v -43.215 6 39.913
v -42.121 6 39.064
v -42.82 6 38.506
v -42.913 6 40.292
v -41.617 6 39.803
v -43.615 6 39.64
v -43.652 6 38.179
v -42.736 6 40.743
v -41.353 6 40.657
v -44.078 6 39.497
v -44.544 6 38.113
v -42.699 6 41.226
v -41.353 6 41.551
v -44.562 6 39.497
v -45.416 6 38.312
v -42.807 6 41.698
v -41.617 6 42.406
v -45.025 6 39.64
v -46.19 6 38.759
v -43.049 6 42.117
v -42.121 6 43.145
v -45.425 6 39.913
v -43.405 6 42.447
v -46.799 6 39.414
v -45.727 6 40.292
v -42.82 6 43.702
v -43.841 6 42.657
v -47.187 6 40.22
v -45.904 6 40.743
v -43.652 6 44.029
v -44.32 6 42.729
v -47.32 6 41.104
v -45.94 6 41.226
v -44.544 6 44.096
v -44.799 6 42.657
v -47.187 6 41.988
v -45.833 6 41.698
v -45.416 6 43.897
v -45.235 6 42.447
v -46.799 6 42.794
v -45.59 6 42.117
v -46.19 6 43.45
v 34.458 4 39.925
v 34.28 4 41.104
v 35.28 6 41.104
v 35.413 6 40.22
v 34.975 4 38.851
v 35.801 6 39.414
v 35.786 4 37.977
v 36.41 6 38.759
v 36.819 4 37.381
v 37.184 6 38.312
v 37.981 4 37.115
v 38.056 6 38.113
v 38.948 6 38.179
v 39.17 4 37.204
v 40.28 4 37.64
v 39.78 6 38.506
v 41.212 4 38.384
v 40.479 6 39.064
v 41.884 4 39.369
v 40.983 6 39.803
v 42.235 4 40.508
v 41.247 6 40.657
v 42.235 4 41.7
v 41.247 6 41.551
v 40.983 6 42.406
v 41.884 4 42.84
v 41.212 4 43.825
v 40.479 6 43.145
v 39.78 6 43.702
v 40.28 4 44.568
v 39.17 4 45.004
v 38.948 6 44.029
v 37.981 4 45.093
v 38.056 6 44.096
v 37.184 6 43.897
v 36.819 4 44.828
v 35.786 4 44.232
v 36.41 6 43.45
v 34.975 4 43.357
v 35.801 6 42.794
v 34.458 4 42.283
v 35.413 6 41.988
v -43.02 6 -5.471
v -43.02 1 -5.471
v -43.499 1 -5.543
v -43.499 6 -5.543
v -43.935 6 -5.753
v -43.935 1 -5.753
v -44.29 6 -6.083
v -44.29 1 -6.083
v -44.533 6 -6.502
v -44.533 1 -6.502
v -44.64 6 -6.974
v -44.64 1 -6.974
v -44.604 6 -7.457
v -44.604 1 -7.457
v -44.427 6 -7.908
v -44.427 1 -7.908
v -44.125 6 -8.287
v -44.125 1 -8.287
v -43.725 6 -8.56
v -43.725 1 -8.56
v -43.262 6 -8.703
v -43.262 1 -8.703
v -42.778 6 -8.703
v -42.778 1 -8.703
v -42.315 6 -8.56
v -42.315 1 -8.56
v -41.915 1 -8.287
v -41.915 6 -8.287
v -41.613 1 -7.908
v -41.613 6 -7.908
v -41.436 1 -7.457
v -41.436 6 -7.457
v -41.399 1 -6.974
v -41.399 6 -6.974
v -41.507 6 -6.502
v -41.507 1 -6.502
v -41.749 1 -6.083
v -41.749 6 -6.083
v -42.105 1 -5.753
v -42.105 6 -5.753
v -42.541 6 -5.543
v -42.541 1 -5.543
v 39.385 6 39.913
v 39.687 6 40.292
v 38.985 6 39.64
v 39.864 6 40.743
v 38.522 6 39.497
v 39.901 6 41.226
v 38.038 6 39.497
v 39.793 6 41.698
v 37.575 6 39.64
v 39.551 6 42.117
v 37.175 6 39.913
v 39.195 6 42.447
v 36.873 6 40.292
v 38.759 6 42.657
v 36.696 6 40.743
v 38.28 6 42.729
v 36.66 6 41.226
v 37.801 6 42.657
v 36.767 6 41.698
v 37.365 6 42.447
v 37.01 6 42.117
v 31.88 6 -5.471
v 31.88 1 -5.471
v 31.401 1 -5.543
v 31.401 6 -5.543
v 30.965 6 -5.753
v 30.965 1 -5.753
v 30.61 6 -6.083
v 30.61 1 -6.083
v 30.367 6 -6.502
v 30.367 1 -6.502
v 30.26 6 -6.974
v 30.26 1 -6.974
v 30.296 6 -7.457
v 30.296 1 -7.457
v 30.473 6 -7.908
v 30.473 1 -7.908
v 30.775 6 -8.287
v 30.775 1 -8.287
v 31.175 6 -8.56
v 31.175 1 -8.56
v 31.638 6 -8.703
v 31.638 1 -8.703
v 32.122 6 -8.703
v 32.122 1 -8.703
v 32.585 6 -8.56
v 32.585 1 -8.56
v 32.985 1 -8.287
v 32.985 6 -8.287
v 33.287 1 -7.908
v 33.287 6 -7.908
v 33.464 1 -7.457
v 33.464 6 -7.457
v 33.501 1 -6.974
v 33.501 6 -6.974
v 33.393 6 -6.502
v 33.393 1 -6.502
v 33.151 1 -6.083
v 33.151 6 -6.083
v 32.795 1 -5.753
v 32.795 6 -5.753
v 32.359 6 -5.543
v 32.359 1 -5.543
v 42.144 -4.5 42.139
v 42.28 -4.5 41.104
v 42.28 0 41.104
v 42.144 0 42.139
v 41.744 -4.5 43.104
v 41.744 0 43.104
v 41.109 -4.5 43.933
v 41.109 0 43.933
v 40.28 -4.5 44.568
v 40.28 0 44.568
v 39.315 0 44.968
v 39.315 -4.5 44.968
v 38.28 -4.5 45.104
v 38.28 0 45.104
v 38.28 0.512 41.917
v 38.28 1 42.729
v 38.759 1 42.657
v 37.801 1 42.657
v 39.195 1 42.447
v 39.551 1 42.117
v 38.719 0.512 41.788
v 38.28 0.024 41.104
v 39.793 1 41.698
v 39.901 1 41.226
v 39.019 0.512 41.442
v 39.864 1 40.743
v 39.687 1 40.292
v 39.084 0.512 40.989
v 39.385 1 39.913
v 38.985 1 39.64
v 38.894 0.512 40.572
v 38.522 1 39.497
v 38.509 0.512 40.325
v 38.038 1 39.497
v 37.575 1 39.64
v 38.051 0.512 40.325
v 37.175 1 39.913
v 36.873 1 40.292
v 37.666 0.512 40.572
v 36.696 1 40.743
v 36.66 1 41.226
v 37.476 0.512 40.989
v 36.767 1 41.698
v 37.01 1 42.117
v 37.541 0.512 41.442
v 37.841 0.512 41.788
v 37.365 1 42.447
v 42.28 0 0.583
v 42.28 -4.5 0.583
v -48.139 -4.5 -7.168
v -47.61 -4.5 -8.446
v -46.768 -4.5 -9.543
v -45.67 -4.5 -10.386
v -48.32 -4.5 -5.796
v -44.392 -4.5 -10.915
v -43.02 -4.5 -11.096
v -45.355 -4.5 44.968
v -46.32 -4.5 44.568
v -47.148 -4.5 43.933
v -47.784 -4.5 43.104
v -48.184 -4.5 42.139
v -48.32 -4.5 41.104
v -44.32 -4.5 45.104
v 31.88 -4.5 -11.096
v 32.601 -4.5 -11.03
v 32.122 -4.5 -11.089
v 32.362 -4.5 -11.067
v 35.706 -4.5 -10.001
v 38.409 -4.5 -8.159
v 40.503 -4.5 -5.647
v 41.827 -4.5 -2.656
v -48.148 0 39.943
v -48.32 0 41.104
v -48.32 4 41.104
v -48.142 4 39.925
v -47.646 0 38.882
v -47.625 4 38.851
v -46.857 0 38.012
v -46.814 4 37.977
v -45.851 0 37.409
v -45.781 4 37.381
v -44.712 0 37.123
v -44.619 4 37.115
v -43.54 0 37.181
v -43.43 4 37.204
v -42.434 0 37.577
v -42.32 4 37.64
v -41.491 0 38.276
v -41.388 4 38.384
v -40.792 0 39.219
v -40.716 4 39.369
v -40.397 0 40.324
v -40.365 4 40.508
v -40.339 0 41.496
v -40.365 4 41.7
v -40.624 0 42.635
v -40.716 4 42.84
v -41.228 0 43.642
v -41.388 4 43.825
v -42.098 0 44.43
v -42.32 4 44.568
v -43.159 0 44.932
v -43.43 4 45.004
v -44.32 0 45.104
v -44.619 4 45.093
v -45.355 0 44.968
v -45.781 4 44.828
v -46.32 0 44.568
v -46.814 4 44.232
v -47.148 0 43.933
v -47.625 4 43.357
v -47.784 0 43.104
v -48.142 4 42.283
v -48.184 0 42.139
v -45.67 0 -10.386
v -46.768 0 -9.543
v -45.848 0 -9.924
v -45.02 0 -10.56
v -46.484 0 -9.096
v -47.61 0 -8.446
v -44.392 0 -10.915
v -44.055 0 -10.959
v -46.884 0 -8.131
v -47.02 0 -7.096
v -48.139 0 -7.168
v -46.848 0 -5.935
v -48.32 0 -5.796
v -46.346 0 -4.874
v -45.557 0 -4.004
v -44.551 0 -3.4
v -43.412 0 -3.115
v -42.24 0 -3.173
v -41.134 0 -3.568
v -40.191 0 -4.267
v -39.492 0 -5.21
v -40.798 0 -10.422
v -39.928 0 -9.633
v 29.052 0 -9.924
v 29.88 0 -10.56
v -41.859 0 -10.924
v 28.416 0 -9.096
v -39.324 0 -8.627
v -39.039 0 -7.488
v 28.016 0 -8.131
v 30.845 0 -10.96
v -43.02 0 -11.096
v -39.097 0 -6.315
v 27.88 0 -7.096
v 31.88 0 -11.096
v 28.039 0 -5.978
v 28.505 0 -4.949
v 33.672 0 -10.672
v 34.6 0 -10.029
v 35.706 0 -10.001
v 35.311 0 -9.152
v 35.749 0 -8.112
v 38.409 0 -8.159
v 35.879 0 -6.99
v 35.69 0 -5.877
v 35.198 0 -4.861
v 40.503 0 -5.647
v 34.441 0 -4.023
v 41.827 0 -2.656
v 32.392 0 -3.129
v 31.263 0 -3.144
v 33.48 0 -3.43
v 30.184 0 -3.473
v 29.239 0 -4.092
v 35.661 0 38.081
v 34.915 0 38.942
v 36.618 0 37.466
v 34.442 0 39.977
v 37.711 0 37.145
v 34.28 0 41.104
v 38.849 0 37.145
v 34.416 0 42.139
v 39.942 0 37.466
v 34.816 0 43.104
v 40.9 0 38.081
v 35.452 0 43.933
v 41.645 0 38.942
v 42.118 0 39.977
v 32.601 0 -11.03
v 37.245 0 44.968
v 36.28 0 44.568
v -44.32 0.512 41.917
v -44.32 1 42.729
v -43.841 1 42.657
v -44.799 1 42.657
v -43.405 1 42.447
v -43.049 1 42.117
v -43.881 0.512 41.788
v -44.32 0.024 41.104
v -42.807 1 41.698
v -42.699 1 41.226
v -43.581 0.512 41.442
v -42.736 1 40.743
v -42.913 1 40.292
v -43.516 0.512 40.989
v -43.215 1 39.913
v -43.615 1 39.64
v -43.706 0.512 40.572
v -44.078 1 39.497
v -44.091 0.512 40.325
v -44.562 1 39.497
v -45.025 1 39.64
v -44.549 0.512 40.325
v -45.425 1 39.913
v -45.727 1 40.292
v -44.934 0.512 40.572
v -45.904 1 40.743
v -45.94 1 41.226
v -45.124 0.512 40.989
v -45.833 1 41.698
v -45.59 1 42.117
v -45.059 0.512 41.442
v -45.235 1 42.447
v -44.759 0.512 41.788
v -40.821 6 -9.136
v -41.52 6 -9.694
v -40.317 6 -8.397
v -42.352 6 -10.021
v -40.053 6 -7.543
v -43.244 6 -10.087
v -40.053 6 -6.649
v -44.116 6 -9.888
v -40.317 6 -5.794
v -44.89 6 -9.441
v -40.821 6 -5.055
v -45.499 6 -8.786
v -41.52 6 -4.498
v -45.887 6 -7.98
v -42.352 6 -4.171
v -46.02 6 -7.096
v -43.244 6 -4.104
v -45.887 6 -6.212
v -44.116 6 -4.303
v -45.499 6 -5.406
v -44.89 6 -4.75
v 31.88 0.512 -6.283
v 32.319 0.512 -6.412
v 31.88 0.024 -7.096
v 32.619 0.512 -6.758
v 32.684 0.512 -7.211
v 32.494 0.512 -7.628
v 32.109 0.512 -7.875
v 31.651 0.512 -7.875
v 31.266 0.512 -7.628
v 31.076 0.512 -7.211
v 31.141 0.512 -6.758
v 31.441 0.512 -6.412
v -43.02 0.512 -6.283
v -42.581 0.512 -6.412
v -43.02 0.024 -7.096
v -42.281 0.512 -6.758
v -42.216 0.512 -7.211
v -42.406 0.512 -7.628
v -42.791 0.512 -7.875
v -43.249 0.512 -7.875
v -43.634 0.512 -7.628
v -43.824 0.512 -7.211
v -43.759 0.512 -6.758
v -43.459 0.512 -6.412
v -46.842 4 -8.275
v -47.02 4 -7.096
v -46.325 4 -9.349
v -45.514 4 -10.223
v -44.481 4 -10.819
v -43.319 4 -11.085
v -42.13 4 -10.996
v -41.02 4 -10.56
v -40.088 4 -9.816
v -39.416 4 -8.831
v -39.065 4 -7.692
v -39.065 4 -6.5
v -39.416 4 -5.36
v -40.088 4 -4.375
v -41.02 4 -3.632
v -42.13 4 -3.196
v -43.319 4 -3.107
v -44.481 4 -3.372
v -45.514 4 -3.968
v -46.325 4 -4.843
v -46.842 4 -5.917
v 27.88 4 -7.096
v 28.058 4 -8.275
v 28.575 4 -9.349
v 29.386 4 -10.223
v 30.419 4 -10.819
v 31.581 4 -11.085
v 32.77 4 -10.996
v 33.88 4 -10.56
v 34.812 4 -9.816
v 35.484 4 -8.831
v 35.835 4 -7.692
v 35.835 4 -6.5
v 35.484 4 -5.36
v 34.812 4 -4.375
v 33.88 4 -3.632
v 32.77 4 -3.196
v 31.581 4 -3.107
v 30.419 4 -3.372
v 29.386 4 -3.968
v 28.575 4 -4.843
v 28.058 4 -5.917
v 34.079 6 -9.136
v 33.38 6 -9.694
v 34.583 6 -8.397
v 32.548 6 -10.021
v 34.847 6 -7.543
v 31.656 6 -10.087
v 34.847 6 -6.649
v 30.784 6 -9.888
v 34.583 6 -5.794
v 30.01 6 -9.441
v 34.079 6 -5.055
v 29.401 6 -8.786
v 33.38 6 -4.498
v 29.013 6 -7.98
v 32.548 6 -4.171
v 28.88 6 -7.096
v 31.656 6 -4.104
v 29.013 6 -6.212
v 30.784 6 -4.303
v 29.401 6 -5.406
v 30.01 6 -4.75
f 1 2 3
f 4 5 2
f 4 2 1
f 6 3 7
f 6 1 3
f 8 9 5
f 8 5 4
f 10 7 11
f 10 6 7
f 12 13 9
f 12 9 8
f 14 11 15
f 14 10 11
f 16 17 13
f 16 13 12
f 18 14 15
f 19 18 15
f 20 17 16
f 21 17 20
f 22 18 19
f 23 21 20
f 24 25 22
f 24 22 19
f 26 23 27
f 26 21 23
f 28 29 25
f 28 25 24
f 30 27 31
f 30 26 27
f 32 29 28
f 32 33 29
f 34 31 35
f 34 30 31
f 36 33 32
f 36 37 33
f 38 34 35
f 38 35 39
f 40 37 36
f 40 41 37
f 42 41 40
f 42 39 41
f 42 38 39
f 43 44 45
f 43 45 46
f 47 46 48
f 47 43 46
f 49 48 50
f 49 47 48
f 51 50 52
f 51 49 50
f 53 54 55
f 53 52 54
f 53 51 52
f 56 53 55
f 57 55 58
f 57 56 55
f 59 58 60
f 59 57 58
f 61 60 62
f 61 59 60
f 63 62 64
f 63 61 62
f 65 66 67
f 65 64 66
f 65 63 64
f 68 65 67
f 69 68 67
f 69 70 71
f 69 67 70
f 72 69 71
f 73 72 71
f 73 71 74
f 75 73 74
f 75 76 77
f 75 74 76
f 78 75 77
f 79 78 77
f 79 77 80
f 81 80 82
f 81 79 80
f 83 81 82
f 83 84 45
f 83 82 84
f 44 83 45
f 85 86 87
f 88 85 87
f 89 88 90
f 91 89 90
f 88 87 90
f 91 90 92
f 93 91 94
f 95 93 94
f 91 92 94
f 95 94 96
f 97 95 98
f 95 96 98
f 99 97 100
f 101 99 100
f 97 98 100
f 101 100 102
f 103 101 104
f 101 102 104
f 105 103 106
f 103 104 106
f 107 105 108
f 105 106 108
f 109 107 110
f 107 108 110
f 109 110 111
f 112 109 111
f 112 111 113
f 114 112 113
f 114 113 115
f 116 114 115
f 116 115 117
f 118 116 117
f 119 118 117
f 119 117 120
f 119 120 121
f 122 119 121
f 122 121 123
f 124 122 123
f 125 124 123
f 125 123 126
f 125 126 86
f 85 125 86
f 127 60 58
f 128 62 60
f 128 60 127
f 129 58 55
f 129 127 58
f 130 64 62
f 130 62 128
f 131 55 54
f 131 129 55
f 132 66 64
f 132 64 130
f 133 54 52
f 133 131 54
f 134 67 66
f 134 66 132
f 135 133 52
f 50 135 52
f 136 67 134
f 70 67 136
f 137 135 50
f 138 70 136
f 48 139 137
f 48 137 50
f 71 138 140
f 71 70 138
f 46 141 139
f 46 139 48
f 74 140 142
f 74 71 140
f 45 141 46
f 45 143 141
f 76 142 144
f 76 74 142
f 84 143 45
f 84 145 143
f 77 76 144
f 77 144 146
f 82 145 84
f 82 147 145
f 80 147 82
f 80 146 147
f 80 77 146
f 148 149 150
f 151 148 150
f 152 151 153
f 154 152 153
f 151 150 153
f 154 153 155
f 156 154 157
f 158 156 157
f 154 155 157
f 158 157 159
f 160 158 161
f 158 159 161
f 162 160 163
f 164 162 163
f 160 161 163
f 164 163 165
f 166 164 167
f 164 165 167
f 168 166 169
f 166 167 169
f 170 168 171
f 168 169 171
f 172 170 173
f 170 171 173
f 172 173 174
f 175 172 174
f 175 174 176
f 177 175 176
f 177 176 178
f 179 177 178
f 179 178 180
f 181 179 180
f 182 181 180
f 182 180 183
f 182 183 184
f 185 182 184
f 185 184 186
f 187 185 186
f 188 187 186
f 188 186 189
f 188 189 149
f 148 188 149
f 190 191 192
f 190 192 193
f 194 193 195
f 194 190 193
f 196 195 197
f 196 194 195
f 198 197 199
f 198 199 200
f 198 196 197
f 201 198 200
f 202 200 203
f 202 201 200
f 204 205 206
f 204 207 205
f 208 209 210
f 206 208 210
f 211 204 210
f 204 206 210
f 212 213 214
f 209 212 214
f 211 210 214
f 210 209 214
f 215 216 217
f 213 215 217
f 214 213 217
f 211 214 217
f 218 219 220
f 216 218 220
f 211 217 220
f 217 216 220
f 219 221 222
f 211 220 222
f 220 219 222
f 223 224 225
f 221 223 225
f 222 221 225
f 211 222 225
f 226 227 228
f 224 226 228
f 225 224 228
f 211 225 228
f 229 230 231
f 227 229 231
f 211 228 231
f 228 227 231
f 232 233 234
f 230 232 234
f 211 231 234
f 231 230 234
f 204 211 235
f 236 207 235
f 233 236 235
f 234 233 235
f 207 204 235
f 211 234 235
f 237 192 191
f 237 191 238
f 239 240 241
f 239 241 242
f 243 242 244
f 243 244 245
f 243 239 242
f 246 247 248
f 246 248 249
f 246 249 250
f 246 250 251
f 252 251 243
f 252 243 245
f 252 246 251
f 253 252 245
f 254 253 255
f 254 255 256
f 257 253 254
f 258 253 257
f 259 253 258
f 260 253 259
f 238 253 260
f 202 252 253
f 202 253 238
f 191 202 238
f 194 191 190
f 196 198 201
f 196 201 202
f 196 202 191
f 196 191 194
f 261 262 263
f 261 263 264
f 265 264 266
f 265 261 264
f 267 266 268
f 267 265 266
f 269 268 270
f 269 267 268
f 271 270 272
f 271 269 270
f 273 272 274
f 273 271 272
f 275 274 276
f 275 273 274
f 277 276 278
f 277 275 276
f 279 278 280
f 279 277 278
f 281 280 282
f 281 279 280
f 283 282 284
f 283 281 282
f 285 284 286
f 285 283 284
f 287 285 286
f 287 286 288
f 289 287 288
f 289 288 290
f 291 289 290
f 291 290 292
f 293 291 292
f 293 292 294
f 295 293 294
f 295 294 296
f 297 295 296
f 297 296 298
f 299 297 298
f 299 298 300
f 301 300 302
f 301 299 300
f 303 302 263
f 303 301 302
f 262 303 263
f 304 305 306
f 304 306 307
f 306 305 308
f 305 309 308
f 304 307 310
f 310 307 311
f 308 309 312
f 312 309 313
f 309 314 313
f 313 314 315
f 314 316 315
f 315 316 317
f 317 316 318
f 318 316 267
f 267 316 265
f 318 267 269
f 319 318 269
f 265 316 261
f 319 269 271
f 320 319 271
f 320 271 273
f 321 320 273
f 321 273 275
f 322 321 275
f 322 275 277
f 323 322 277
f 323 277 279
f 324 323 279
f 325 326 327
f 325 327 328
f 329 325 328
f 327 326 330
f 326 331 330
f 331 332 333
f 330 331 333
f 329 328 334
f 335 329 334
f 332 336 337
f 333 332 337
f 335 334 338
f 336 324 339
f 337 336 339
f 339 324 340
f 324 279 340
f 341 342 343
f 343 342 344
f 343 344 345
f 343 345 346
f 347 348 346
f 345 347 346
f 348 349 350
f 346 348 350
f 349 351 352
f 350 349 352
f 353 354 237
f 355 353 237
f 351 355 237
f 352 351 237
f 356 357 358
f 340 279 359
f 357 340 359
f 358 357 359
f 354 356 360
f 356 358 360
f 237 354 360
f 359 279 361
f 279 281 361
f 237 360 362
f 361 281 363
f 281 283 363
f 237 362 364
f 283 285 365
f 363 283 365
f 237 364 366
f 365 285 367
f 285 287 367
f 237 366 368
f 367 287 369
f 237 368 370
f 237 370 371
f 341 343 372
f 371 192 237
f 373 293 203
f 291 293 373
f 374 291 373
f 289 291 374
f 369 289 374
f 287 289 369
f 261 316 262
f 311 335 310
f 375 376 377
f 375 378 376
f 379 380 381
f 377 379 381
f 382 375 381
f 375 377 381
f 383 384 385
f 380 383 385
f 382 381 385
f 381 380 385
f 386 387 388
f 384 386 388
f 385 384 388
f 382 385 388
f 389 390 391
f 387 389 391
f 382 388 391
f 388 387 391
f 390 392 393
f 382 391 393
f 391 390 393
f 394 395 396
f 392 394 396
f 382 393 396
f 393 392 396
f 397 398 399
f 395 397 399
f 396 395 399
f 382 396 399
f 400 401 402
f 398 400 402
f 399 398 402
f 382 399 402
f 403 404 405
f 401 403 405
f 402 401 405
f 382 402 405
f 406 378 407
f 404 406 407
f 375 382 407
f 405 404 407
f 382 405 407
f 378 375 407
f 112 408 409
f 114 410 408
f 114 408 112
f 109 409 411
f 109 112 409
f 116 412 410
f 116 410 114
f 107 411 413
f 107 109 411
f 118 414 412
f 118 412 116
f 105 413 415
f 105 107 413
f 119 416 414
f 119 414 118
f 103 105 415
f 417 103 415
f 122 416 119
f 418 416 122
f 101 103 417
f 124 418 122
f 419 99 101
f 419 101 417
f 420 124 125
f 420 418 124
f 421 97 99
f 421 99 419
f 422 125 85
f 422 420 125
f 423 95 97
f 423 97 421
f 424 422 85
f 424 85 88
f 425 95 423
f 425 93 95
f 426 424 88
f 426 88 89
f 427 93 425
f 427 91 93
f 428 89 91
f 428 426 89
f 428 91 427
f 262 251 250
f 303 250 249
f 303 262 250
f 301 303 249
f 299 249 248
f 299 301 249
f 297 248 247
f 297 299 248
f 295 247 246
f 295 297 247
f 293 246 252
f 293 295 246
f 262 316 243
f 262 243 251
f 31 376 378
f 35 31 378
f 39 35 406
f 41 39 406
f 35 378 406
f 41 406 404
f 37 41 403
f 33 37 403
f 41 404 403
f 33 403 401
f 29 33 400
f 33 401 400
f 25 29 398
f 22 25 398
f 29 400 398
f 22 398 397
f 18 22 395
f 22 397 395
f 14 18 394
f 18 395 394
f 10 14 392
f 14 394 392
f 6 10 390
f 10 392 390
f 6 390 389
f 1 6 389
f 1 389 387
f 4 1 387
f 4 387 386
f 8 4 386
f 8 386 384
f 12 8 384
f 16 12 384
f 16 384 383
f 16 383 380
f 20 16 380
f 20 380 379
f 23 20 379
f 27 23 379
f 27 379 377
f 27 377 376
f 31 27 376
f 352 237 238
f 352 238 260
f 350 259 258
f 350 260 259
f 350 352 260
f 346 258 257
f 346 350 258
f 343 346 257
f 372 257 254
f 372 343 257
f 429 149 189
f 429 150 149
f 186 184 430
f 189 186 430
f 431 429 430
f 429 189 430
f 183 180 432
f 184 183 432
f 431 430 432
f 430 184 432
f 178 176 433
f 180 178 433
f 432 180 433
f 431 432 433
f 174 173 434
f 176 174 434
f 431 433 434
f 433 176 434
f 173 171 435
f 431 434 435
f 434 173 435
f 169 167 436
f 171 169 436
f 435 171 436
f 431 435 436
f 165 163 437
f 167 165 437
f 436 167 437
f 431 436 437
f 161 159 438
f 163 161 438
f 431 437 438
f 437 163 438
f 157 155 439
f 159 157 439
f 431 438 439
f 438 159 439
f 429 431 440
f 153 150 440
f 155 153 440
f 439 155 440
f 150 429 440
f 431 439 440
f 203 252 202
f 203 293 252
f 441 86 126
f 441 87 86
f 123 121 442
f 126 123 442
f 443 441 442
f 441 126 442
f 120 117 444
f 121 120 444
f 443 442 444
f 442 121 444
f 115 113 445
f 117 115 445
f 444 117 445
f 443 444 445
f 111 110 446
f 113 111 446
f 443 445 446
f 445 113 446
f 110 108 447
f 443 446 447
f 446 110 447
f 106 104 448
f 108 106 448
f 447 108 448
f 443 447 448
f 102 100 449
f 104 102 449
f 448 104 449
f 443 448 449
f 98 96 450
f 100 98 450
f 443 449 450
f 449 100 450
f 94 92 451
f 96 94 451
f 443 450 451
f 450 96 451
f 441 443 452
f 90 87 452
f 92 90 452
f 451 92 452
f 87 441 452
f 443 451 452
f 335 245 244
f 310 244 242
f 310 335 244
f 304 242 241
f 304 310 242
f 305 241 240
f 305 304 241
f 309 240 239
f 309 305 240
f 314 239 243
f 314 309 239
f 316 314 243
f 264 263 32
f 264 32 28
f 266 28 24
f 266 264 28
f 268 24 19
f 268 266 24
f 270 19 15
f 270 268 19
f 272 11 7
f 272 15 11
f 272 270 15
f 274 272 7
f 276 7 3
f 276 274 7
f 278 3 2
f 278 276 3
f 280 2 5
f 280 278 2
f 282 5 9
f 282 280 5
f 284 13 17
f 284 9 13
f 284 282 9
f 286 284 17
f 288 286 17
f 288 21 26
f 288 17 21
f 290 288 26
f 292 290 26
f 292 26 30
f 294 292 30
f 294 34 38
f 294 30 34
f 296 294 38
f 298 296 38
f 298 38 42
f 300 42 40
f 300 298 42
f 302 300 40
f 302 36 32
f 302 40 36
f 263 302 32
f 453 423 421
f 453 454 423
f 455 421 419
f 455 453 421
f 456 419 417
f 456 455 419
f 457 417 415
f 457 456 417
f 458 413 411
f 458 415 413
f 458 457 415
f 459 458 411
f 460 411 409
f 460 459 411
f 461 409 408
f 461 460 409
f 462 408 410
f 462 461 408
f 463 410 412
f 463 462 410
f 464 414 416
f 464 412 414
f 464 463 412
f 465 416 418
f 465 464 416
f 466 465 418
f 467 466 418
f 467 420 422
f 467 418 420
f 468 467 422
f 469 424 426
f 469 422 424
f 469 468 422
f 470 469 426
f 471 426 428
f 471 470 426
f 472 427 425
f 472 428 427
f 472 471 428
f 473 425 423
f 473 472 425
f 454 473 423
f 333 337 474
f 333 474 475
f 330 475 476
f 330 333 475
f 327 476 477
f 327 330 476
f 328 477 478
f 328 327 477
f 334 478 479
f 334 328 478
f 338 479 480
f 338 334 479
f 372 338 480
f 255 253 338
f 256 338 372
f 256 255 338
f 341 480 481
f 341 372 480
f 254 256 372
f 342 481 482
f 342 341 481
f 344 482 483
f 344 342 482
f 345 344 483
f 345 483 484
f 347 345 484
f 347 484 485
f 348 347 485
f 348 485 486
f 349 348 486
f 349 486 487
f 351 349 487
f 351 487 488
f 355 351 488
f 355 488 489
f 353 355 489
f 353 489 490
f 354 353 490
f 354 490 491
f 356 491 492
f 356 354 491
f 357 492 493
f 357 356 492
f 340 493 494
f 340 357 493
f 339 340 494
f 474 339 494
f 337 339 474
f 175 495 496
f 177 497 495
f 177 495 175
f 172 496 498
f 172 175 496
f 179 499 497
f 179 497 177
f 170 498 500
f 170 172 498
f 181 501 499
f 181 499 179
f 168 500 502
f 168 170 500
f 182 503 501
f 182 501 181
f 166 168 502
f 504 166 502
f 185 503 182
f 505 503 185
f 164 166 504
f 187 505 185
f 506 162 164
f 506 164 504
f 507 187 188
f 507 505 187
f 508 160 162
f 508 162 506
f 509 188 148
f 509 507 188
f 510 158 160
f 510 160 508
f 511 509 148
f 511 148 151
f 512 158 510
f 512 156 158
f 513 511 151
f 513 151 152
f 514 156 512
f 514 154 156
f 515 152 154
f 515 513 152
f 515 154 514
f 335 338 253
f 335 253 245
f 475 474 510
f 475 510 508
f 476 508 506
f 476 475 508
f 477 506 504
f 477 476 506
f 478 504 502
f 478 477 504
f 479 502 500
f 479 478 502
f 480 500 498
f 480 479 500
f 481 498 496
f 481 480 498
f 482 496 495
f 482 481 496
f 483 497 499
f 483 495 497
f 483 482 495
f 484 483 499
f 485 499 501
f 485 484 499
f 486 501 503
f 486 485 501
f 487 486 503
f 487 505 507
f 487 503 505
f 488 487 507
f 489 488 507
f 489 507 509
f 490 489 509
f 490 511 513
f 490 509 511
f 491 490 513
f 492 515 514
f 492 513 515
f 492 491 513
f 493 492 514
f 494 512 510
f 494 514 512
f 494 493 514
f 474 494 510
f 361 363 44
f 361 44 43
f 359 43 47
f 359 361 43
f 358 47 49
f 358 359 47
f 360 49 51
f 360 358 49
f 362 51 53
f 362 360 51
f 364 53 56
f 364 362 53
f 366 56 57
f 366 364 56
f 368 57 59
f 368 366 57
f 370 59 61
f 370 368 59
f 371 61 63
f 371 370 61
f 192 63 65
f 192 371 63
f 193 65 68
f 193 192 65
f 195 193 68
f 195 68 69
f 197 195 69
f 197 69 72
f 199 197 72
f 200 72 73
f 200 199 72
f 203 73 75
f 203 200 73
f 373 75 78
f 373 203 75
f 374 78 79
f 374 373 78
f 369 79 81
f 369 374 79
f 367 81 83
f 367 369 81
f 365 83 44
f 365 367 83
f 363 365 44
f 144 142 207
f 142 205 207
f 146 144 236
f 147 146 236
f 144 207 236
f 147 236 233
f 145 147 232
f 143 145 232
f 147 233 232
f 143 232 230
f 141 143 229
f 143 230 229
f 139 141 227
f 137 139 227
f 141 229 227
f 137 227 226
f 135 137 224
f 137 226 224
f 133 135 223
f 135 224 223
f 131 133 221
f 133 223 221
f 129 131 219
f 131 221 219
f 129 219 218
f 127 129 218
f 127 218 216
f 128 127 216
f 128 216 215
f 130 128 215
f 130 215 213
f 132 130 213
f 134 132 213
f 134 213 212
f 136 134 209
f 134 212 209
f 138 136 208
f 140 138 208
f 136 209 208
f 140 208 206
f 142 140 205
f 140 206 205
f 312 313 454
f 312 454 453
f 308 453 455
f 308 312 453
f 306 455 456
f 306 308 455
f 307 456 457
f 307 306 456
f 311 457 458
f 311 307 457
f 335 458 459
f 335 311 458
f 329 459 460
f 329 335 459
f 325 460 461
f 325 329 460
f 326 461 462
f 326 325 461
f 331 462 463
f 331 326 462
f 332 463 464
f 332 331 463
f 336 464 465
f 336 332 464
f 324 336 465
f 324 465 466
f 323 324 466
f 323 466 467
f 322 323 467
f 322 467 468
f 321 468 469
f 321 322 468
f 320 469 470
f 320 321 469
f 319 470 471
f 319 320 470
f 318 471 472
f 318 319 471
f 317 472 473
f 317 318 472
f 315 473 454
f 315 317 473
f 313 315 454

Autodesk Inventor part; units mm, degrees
ref_plane "YZ Plane" through (0, 0, 0) normal (1, 0, 0) x (0, 1, 0)
ref_plane "XZ Plane" through (0, 0, 0) normal (0, 1, 0) x (-1, 0, 0)
ref_plane "XY Plane" through (0, 0, 0) normal (0, 0, 1) x (1, 0, 0)
sketch "Arduino Hole Layout" plane through (0, 0, 0) normal (0, 1, 0) x (-1, 0, 0)
  circle A0 centre (43.0199, -7.0958) radius 1.55 construction
  circle A1 centre (-31.8801, -7.0958) radius 1.55 construction
  circle A2 centre (44.3199, 41.1042) radius 1.55 construction
  circle A3 centre (-38.2801, 41.1042) radius 1.55 construction
  line L0 (58.8879, -10.055) -> (-40.7911, -10.055) construction
  line L1 (-40.7911, -10.055) -> (-40.7911, 44.0634) construction
  line L2 (-40.7911, 44.0634) -> (58.8879, 44.0634) construction
  line L3 (58.8879, 44.0634) -> (58.8879, -10.055) construction
  line L4 (43.0199, -7.0958) -> (43.0199, -10.055) construction
  line L5 (44.3199, 41.1042) -> (44.3199, 44.0634) construction
  dimension "d0" = 3.1
  dimension "d1" = 74.9
  dimension "d2" = 1.3
  dimension "d3" = 48.2
  dimension "d5" = 82.6
  dimension "d9" = 15.868
  dimension "d10" = 54.1184
  dimension "d11" = 99.679
sketch "Sketch13" plane through (0, 0, 0) normal (0, 1, 0) x (-1, 0, 0)
  circle A0 centre (43.0199, -7.0958) radius 1.55 construction
  circle A1 centre (43.0199, -7.0958) radius 4
  point P0 (0, 0)
  point P1 (-38.2801, 41.1042)
  point P2 (-31.8801, -7.0958)
  point P3 (-38.2801, 41.1042)
  point P4 (44.3199, 41.1042)
  dimension "d48" = 8
extrude "Extrusion10" add sketch "Sketch13" along normal blind 6
sketch "Sketch14" plane through (-43.0199, 6, -7.0958) normal (0, 1, 0) x (1, 0, 0)
  circle A0 centre (0, 0) radius 4 construction
  point P0 (43.0199, -7.0958)
  point P1 (81.3, -48.2)
  point P2 (-1.3, -48.2)
  point P3 (74.9, 0)
  point P4 (81.3, -48.2)
  point P5 (-1.3, -48.2)
hole "Hole2" at (-43.0199, 6, -7.0958) direction (0, -1, 0) diameter 3.25 depth 5 tip angle 118
chamfer "Chamfer2" distance 1 distance2 2 1 edges at (-39.0199, 6, -7.0958) measured on face at (-46.1856, 6, -7.4802)
pattern_sketch "Sketch Driven Pattern1" from (-43.0199, 0, -7.0958) copies at (-44.3199, 0, 41.1042) at (31.8801, 0, -7.0958) at (38.2801, 0, 41.1042)
sketch "Sketch16" plane through (-44.3199, 0, 41.1042) normal (0, -1, 0) x (1, 0, 0)
  line L0 (-4, 4) -> (86.6, 4)
  line L1 (86.6, 4) -> (86.6, -52.2)
  line L2 (86.6, -52.2) -> (-4, -52.2)
  line L3 (-4, -52.2) -> (-4, 4)
  circle A0 centre (0, 0) radius 4 projected
  circle A1 centre (82.6, 0) radius 4 projected
  circle A2 centre (1.3, -48.2) radius 4 projected
  arc A3 (-4, -46.9) -> (1.3, -52.2) centre (1.3, -46.9) ccw
  arc A4 (73.0608, -52.2) -> (86.6, -40.521) centre (74.7932, -40.521) ccw
  circle A5 centre (76.2, -48.2) radius 4 projected
  point P0 (44.3199, -41.1042)
  point P1 (76.9208, -52.1345)
  point P2 (86.6, 0)
  point P3 (82.6, 4)
  point P4 (0, 4)
  point P5 (-4, 0)
  point P6 (76.2, -52.2)
extrude "Extrusion12" add sketch "Sketch16" along normal blind 4.5 contours A2 | L0 A1 L1 A4 A5 L2 A3 L3 A0 | A0 | A1 | A5
properties part number "arduino_mega_standoffs_plate"
